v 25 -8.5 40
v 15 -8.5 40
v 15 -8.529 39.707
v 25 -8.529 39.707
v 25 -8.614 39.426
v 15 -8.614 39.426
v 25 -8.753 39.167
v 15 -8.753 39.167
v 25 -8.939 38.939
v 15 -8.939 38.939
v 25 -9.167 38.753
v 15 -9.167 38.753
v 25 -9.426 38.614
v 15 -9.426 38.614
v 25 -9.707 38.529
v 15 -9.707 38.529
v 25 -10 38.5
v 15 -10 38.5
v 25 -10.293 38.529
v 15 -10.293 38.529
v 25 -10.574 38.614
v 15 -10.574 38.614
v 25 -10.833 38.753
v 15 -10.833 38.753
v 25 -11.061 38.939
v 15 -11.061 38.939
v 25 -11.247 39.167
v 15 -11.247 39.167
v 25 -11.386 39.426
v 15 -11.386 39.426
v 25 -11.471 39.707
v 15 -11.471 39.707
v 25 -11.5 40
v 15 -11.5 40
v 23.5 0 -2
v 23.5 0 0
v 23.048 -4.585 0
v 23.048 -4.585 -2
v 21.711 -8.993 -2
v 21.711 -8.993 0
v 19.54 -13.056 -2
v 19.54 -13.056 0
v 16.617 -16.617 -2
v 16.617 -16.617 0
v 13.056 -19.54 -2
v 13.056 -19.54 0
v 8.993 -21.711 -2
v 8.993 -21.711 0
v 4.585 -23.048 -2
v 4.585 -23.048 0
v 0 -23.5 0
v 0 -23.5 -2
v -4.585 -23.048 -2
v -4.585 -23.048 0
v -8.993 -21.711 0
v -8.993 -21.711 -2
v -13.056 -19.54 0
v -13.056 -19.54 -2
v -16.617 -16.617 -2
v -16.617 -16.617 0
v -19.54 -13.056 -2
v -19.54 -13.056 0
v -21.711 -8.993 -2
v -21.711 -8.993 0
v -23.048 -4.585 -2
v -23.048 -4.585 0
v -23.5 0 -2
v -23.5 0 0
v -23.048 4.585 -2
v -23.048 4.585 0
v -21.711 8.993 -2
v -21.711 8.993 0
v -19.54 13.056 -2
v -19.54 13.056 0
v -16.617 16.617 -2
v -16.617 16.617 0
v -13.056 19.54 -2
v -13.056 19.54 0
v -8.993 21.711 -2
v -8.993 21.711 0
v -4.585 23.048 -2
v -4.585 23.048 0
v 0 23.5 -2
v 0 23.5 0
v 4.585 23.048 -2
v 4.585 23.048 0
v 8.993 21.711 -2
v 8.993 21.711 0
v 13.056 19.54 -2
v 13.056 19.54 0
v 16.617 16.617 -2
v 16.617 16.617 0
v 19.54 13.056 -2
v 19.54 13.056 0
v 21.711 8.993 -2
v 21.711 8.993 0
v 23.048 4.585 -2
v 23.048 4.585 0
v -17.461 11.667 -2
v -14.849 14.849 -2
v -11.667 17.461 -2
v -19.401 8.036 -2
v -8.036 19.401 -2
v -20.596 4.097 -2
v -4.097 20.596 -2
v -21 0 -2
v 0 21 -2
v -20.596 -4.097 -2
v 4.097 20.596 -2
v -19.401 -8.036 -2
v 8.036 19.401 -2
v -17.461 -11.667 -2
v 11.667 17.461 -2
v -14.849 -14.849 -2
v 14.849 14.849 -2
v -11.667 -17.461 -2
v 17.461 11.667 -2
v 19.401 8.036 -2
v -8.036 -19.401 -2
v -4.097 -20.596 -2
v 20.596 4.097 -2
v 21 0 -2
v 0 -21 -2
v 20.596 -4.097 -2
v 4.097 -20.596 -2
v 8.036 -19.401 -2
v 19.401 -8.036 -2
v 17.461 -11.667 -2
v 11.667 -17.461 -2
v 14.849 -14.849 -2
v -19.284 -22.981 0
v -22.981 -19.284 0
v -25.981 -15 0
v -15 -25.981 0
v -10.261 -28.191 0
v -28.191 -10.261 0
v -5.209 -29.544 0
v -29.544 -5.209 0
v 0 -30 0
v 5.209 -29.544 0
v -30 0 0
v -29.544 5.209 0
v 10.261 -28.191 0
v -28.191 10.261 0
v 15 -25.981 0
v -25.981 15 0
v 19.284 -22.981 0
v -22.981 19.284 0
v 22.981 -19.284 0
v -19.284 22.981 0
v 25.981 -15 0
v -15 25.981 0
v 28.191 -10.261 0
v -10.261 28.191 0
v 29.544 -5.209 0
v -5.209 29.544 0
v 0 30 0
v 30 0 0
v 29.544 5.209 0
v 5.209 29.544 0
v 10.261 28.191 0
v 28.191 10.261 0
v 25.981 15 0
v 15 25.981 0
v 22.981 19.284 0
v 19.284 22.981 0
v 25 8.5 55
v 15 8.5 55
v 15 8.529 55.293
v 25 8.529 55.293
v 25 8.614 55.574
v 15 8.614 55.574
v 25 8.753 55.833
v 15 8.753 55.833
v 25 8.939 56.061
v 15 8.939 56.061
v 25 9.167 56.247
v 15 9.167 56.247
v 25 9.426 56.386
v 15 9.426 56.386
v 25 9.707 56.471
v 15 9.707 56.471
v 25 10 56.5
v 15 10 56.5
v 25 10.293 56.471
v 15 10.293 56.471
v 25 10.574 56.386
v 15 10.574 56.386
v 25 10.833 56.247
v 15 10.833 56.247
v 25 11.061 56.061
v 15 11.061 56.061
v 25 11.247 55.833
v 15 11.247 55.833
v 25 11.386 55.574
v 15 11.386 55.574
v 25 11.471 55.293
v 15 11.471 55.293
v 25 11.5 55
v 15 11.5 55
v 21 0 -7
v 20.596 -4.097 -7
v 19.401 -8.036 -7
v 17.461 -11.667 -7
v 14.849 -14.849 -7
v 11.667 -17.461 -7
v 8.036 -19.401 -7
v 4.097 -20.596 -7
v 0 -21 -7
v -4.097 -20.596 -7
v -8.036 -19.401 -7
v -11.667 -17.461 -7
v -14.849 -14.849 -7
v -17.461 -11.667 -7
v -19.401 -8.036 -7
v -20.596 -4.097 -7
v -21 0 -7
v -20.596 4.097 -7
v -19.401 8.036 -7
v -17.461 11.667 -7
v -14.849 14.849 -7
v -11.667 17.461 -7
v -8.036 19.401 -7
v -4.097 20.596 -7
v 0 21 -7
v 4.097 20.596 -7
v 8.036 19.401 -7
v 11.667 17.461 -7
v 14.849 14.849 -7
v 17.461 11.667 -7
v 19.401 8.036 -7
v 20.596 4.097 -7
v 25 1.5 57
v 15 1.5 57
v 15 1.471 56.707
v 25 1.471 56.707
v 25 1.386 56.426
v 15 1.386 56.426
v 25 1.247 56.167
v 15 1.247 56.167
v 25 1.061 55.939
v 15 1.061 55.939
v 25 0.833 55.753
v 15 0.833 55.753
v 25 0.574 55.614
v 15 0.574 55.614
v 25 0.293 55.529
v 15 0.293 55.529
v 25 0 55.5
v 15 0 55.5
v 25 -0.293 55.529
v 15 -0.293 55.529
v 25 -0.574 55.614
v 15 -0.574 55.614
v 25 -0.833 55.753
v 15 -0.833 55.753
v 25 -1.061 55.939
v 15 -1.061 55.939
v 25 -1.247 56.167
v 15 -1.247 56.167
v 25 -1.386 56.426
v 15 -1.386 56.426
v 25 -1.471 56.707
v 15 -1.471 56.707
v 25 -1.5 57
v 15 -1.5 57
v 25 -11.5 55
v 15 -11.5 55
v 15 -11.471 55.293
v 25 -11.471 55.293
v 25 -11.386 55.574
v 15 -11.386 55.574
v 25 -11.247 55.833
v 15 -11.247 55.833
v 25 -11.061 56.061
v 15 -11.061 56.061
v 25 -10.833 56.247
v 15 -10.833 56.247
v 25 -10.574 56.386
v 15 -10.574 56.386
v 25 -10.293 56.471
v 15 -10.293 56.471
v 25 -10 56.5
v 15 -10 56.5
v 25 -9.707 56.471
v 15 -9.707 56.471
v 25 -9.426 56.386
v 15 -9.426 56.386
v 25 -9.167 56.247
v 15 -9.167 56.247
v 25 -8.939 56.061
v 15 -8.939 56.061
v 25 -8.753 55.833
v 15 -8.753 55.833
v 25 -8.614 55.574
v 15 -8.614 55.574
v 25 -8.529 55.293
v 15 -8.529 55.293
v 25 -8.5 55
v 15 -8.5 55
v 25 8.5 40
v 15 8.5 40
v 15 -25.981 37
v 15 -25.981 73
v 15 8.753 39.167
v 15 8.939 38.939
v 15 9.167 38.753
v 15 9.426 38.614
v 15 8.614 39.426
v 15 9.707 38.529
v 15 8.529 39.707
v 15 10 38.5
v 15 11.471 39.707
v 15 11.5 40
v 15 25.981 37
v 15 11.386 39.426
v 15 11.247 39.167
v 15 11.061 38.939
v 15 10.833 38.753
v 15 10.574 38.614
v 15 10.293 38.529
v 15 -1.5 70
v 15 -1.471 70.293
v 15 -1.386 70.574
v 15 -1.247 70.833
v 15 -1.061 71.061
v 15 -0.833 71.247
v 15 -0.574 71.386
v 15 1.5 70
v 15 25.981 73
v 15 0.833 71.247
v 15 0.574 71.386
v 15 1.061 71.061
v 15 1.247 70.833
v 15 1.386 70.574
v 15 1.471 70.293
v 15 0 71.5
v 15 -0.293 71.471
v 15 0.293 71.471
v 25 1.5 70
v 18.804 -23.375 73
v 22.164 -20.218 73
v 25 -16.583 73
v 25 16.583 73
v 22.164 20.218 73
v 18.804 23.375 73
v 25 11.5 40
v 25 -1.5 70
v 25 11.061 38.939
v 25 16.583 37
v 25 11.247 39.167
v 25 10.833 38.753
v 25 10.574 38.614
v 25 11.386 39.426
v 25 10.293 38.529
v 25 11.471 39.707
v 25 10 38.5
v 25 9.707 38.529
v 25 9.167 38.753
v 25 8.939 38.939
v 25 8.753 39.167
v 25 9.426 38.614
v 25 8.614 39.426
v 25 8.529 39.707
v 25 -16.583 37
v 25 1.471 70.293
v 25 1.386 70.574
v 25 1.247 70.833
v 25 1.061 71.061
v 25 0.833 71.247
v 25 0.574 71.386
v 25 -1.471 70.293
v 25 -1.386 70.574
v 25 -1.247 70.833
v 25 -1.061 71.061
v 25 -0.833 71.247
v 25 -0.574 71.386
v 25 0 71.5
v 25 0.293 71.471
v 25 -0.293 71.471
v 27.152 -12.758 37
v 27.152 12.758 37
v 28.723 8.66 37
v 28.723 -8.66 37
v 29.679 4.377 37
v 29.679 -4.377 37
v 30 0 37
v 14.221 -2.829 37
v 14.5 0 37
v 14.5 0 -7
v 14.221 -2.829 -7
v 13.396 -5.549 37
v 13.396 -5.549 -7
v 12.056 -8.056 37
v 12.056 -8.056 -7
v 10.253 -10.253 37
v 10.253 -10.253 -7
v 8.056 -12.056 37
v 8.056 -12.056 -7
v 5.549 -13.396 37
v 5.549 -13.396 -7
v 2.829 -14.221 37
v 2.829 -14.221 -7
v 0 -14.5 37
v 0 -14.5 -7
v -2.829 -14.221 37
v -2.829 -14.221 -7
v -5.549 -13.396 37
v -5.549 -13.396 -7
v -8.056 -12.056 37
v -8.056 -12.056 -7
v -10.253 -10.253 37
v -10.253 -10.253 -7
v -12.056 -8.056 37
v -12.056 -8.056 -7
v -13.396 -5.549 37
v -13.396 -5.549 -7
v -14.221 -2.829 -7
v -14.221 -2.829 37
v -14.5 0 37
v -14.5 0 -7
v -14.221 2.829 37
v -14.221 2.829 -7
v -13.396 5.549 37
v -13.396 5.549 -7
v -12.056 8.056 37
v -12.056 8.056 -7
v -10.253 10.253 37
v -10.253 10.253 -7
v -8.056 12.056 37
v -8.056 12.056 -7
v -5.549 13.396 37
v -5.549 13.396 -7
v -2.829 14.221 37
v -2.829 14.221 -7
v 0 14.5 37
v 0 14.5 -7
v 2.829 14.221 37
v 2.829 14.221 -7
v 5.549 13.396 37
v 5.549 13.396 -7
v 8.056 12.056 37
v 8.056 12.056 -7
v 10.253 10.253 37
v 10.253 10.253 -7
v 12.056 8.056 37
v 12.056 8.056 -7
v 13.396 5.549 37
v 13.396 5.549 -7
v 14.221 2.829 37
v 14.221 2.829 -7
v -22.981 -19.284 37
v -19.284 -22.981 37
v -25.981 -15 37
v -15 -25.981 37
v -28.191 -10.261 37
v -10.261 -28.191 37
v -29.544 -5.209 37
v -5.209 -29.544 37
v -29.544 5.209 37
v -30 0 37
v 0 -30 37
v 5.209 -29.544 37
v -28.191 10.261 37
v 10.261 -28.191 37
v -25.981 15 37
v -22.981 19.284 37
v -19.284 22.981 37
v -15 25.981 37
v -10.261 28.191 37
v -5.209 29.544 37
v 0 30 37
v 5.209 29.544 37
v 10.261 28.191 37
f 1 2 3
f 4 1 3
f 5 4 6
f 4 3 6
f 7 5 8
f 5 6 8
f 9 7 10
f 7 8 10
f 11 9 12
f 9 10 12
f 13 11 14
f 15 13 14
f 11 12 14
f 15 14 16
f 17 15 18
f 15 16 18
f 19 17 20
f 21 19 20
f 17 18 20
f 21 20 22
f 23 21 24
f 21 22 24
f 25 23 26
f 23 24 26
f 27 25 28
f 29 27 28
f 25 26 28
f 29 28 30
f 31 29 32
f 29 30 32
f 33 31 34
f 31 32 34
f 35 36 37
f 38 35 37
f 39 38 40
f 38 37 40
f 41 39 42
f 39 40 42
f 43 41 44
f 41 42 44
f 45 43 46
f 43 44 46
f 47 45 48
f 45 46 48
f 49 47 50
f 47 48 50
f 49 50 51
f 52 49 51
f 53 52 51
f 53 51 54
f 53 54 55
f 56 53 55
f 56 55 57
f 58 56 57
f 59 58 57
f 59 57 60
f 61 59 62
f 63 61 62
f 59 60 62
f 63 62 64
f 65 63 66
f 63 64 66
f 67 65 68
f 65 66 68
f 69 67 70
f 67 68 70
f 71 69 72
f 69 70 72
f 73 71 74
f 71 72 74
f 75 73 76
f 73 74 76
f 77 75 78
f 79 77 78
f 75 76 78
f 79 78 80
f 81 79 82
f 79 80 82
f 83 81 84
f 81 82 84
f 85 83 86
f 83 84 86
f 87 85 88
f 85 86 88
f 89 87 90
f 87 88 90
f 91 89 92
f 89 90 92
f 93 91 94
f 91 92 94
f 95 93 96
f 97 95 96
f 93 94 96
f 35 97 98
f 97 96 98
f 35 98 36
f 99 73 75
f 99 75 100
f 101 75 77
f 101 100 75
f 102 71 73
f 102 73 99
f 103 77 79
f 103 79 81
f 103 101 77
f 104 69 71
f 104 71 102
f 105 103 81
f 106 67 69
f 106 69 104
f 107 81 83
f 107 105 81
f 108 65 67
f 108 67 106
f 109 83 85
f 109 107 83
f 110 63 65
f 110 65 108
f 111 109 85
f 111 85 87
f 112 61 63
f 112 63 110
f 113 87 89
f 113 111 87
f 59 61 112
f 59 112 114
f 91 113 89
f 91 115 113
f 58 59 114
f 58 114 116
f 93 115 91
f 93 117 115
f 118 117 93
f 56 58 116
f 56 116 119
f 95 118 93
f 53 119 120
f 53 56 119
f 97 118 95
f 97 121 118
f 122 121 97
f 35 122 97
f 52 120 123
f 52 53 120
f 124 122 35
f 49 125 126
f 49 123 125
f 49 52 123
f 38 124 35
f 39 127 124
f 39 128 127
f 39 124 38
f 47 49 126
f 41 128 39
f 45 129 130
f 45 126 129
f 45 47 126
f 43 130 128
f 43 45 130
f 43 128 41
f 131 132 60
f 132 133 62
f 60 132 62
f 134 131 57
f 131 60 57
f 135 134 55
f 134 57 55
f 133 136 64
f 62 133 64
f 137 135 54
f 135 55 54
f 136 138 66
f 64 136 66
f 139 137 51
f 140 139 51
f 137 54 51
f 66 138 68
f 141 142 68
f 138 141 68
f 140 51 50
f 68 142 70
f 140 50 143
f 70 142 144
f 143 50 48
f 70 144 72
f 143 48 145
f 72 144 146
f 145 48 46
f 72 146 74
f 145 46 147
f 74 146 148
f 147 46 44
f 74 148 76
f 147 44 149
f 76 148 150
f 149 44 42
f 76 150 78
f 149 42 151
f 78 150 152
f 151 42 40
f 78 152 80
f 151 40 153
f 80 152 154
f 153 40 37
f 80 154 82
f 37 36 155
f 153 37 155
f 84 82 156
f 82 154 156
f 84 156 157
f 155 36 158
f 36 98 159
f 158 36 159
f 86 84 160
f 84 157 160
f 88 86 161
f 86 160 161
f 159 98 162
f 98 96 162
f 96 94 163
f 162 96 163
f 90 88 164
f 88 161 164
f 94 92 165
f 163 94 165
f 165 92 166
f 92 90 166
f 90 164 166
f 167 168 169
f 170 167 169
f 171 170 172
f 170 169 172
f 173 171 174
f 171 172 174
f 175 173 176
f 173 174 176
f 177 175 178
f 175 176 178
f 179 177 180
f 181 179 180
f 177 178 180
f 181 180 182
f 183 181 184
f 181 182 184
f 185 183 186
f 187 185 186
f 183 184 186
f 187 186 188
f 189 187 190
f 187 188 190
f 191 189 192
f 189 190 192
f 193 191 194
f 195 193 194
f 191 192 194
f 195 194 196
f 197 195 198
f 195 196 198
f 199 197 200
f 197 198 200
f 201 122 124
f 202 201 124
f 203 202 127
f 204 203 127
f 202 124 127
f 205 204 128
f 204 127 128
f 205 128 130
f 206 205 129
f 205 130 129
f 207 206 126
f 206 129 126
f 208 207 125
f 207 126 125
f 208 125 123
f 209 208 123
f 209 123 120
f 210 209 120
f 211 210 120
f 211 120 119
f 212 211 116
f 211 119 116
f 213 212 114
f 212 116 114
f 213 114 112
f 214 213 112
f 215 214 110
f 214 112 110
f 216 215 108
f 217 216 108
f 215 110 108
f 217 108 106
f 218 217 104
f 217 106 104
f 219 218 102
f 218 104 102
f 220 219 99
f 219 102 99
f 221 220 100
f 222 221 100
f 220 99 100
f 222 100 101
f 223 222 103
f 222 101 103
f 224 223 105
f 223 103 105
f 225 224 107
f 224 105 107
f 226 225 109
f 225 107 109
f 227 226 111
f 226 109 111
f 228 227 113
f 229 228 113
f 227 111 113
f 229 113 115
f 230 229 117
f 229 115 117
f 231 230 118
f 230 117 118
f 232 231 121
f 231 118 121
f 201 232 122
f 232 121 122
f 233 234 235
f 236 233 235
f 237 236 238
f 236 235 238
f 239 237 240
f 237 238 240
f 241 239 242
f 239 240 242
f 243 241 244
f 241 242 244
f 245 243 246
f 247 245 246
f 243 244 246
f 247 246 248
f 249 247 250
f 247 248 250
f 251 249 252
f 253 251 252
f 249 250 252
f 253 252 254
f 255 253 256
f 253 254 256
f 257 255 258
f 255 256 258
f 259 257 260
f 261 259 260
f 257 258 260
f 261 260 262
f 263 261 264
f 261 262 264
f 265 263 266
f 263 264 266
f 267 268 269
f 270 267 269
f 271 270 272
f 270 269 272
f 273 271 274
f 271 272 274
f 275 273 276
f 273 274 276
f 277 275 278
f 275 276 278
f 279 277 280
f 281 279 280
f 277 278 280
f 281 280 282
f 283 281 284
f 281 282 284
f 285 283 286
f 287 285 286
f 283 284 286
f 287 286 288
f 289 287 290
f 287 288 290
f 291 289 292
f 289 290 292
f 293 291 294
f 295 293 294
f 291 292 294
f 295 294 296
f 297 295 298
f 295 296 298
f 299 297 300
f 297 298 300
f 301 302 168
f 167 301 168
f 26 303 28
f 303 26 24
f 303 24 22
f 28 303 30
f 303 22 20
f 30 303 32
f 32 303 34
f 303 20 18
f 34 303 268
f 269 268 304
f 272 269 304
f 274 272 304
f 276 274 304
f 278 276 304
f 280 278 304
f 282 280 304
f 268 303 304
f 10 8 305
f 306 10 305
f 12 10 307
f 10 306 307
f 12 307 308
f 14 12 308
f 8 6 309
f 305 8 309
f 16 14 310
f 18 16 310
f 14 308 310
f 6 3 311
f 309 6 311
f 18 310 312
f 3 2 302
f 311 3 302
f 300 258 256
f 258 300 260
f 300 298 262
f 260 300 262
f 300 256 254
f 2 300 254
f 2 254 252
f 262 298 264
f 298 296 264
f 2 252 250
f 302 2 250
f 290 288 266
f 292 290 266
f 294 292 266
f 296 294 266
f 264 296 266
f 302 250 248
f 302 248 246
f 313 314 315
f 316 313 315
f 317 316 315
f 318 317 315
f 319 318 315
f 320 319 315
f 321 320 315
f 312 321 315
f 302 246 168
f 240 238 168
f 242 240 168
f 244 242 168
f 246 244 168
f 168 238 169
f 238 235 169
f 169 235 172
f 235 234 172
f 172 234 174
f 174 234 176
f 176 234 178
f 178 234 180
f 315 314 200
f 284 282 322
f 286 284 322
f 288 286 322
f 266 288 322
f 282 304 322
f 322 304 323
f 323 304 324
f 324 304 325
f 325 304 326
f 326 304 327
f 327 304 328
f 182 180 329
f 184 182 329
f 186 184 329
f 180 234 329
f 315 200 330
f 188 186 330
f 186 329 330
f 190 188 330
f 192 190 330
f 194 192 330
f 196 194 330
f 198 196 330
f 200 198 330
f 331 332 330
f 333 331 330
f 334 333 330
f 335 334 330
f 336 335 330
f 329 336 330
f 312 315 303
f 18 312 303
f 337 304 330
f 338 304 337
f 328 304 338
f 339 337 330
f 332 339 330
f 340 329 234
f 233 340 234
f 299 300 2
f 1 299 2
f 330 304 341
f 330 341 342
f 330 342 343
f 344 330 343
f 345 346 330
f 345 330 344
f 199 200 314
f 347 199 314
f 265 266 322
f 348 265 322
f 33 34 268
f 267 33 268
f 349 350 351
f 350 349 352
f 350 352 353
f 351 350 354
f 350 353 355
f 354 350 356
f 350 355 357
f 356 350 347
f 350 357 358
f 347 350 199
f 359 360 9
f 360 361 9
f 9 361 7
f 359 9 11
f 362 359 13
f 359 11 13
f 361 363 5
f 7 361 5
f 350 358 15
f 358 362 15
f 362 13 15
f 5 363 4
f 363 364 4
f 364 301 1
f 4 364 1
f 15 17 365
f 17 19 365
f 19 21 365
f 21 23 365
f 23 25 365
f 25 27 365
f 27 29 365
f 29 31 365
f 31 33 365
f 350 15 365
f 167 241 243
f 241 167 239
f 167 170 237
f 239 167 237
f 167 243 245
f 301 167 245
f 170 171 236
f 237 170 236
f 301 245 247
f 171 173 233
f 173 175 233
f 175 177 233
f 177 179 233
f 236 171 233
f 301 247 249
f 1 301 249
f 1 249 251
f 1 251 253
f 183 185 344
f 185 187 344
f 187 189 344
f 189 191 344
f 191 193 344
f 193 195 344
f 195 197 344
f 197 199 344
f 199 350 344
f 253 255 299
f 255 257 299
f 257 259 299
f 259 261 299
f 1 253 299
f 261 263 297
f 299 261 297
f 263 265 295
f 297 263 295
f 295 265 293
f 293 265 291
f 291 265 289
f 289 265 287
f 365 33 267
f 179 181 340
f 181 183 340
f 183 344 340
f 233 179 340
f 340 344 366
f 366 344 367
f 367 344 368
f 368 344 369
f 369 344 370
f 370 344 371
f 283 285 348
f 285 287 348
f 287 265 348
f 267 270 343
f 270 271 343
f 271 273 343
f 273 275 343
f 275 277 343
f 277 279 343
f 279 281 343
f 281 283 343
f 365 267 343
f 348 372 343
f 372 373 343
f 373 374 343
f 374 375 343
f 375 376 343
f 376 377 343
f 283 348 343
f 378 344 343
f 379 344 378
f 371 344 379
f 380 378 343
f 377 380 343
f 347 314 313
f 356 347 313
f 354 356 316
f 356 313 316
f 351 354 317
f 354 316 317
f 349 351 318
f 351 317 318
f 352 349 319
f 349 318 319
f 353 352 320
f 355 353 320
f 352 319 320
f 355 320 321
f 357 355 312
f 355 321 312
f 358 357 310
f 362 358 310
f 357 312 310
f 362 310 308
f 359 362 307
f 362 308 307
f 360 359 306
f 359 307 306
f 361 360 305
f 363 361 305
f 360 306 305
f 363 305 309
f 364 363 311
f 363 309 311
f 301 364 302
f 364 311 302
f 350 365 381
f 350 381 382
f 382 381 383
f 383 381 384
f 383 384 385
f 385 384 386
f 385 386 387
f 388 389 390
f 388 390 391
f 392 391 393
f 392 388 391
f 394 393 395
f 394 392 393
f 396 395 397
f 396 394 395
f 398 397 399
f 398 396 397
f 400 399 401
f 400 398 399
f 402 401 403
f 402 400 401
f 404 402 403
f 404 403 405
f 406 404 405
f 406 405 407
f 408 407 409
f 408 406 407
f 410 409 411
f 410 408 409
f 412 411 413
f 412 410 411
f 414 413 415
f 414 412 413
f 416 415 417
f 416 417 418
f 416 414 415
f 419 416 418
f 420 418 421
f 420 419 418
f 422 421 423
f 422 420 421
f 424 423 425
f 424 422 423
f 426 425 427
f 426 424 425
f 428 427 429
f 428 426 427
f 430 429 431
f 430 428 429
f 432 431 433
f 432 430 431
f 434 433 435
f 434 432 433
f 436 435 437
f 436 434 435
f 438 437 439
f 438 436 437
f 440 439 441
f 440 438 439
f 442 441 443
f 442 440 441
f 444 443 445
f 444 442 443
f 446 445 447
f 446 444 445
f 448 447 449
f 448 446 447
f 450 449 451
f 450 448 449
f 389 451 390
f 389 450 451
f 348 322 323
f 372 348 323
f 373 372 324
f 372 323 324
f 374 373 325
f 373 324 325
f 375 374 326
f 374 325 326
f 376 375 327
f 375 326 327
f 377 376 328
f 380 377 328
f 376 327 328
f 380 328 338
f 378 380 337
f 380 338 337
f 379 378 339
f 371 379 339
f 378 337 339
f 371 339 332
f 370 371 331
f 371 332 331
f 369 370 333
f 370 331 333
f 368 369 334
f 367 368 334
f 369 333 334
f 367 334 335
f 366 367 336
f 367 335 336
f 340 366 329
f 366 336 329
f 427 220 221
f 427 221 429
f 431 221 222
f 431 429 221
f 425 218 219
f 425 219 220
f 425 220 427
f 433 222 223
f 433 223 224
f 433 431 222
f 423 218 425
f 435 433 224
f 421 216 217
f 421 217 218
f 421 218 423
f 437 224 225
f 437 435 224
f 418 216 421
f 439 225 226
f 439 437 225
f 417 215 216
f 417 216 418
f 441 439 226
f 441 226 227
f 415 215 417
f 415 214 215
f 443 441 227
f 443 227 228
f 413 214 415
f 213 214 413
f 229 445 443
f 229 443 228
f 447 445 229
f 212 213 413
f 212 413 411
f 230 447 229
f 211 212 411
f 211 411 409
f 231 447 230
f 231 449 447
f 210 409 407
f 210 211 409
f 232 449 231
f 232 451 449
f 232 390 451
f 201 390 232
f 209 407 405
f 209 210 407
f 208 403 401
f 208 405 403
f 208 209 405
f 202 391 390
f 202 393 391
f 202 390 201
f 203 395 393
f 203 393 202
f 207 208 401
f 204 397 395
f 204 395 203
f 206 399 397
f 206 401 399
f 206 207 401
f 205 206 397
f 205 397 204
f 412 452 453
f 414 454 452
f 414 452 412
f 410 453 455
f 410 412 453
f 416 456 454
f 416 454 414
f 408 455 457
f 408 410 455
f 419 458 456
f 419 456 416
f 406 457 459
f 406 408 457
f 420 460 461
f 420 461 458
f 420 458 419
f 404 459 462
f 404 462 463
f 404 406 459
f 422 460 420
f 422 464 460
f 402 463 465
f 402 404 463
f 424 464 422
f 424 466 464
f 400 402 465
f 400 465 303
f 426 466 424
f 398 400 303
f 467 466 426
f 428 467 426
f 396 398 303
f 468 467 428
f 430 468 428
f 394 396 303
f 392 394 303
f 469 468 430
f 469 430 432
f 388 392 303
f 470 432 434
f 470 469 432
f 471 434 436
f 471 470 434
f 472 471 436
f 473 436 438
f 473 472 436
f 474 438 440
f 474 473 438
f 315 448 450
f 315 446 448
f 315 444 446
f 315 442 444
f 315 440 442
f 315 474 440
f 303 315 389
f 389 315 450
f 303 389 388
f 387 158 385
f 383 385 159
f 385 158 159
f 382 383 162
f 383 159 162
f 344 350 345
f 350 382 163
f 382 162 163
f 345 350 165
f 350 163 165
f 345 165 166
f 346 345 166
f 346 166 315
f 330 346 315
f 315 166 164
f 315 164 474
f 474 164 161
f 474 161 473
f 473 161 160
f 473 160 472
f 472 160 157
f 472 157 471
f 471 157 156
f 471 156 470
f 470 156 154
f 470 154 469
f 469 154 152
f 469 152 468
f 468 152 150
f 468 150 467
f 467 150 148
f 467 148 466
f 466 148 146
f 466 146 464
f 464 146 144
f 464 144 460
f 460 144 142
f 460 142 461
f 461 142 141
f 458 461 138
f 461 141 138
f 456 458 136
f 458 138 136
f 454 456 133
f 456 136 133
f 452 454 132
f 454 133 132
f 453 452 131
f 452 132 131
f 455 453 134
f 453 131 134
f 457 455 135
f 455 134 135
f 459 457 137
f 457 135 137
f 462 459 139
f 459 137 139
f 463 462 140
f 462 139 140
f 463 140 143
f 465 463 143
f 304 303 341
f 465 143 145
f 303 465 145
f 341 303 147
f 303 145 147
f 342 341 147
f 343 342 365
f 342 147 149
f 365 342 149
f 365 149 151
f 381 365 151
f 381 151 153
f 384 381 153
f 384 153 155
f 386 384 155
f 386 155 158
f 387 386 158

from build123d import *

# Parameters (mm, degrees)
F0_R     = 30
F0_R_2   = 14.5
F1_DEPTH = 73
F2_R     = 23.5
F2_R_2   = 14.5
F3_DEPTH = 2
F4_R     = 21
F4_R_2   = 14.5
F5_DEPTH = 5
F6_R     = 14.5
F7_DEPTH = 36
F9_DEPTH = 15.001


with BuildPart() as f1:
    # F0 (on Top) → F1 (new body)
    with BuildSketch(Plane.XY):
        Circle(F0_R)
        Circle(F0_R_2, mode=Mode.SUBTRACT)
    extrude(amount=F1_DEPTH)

    # F2 (on face) → F3 (join)
    with BuildSketch(Plane(origin=(0, 0, 0), x_dir=(1, 0, 0), z_dir=(0, 0, -1))):
        Circle(F2_R)
        Circle(F2_R_2, mode=Mode.SUBTRACT)
    extrude(amount=F3_DEPTH)

    # F4 (on face) → F5 (join)
    with BuildSketch(Plane(origin=(0, 0, -2), x_dir=(1, 0, 0), z_dir=(0, 0, -1))):
        Circle(F4_R)
        Circle(F4_R_2, mode=Mode.SUBTRACT)
    extrude(amount=F5_DEPTH)

    # F6 (on face) → F7 (cut)
    with BuildSketch(Plane.XY.offset(73)):
        with BuildLine():
            Line((15, -25.9807621135), (15, 25.9807621135))
            ThreePointArc((15, 25.9807621135), (-30, 0), (15, -25.9807621135))
        make_face()
        Circle(F6_R, mode=Mode.SUBTRACT)
        with BuildLine():
            ThreePointArc((30, 0), (28.7228132327, 8.6602540378), (25, 16.5831239518))
            Line((25, 16.5831239518), (25, -16.5831239518))
            ThreePointArc((25, -16.5831239518), (28.7228132327, -8.6602540378), (30, 0))
        make_face()
    extrude(amount=-F7_DEPTH, mode=Mode.SUBTRACT)

    # F8 (on face) → F9 (cut, through all)
    with BuildSketch(Plane(origin=(15, 0, 0), x_dir=(0, -1, 0), z_dir=(-1, 0, 0))):
        with BuildLine():
            Line((-11.5, 55), (-11.5, 40))
            ThreePointArc((-11.5, 40), (-10, 38.5), (-8.5, 40))
            Line((-8.5, 40), (-8.5, 55))
            ThreePointArc((-8.5, 55), (-10, 56.5), (-11.5, 55))
        make_face()
        with BuildLine():
            Line((8.5, 55), (8.5, 40))
            ThreePointArc((8.5, 40), (10, 38.5), (11.5, 40))
            Line((11.5, 40), (11.5, 55))
            ThreePointArc((11.5, 55), (10, 56.5), (8.5, 55))
        make_face()
        with BuildLine():
            Line((-1.5, 70), (-1.5, 57))
            ThreePointArc((-1.5, 57), (0, 55.5), (1.5, 57))
            Line((1.5, 57), (1.5, 70))
            ThreePointArc((1.5, 70), (0, 71.5), (-1.5, 70))
        make_face()
    extrude(amount=-F9_DEPTH, mode=Mode.SUBTRACT)


solid = f1.part
